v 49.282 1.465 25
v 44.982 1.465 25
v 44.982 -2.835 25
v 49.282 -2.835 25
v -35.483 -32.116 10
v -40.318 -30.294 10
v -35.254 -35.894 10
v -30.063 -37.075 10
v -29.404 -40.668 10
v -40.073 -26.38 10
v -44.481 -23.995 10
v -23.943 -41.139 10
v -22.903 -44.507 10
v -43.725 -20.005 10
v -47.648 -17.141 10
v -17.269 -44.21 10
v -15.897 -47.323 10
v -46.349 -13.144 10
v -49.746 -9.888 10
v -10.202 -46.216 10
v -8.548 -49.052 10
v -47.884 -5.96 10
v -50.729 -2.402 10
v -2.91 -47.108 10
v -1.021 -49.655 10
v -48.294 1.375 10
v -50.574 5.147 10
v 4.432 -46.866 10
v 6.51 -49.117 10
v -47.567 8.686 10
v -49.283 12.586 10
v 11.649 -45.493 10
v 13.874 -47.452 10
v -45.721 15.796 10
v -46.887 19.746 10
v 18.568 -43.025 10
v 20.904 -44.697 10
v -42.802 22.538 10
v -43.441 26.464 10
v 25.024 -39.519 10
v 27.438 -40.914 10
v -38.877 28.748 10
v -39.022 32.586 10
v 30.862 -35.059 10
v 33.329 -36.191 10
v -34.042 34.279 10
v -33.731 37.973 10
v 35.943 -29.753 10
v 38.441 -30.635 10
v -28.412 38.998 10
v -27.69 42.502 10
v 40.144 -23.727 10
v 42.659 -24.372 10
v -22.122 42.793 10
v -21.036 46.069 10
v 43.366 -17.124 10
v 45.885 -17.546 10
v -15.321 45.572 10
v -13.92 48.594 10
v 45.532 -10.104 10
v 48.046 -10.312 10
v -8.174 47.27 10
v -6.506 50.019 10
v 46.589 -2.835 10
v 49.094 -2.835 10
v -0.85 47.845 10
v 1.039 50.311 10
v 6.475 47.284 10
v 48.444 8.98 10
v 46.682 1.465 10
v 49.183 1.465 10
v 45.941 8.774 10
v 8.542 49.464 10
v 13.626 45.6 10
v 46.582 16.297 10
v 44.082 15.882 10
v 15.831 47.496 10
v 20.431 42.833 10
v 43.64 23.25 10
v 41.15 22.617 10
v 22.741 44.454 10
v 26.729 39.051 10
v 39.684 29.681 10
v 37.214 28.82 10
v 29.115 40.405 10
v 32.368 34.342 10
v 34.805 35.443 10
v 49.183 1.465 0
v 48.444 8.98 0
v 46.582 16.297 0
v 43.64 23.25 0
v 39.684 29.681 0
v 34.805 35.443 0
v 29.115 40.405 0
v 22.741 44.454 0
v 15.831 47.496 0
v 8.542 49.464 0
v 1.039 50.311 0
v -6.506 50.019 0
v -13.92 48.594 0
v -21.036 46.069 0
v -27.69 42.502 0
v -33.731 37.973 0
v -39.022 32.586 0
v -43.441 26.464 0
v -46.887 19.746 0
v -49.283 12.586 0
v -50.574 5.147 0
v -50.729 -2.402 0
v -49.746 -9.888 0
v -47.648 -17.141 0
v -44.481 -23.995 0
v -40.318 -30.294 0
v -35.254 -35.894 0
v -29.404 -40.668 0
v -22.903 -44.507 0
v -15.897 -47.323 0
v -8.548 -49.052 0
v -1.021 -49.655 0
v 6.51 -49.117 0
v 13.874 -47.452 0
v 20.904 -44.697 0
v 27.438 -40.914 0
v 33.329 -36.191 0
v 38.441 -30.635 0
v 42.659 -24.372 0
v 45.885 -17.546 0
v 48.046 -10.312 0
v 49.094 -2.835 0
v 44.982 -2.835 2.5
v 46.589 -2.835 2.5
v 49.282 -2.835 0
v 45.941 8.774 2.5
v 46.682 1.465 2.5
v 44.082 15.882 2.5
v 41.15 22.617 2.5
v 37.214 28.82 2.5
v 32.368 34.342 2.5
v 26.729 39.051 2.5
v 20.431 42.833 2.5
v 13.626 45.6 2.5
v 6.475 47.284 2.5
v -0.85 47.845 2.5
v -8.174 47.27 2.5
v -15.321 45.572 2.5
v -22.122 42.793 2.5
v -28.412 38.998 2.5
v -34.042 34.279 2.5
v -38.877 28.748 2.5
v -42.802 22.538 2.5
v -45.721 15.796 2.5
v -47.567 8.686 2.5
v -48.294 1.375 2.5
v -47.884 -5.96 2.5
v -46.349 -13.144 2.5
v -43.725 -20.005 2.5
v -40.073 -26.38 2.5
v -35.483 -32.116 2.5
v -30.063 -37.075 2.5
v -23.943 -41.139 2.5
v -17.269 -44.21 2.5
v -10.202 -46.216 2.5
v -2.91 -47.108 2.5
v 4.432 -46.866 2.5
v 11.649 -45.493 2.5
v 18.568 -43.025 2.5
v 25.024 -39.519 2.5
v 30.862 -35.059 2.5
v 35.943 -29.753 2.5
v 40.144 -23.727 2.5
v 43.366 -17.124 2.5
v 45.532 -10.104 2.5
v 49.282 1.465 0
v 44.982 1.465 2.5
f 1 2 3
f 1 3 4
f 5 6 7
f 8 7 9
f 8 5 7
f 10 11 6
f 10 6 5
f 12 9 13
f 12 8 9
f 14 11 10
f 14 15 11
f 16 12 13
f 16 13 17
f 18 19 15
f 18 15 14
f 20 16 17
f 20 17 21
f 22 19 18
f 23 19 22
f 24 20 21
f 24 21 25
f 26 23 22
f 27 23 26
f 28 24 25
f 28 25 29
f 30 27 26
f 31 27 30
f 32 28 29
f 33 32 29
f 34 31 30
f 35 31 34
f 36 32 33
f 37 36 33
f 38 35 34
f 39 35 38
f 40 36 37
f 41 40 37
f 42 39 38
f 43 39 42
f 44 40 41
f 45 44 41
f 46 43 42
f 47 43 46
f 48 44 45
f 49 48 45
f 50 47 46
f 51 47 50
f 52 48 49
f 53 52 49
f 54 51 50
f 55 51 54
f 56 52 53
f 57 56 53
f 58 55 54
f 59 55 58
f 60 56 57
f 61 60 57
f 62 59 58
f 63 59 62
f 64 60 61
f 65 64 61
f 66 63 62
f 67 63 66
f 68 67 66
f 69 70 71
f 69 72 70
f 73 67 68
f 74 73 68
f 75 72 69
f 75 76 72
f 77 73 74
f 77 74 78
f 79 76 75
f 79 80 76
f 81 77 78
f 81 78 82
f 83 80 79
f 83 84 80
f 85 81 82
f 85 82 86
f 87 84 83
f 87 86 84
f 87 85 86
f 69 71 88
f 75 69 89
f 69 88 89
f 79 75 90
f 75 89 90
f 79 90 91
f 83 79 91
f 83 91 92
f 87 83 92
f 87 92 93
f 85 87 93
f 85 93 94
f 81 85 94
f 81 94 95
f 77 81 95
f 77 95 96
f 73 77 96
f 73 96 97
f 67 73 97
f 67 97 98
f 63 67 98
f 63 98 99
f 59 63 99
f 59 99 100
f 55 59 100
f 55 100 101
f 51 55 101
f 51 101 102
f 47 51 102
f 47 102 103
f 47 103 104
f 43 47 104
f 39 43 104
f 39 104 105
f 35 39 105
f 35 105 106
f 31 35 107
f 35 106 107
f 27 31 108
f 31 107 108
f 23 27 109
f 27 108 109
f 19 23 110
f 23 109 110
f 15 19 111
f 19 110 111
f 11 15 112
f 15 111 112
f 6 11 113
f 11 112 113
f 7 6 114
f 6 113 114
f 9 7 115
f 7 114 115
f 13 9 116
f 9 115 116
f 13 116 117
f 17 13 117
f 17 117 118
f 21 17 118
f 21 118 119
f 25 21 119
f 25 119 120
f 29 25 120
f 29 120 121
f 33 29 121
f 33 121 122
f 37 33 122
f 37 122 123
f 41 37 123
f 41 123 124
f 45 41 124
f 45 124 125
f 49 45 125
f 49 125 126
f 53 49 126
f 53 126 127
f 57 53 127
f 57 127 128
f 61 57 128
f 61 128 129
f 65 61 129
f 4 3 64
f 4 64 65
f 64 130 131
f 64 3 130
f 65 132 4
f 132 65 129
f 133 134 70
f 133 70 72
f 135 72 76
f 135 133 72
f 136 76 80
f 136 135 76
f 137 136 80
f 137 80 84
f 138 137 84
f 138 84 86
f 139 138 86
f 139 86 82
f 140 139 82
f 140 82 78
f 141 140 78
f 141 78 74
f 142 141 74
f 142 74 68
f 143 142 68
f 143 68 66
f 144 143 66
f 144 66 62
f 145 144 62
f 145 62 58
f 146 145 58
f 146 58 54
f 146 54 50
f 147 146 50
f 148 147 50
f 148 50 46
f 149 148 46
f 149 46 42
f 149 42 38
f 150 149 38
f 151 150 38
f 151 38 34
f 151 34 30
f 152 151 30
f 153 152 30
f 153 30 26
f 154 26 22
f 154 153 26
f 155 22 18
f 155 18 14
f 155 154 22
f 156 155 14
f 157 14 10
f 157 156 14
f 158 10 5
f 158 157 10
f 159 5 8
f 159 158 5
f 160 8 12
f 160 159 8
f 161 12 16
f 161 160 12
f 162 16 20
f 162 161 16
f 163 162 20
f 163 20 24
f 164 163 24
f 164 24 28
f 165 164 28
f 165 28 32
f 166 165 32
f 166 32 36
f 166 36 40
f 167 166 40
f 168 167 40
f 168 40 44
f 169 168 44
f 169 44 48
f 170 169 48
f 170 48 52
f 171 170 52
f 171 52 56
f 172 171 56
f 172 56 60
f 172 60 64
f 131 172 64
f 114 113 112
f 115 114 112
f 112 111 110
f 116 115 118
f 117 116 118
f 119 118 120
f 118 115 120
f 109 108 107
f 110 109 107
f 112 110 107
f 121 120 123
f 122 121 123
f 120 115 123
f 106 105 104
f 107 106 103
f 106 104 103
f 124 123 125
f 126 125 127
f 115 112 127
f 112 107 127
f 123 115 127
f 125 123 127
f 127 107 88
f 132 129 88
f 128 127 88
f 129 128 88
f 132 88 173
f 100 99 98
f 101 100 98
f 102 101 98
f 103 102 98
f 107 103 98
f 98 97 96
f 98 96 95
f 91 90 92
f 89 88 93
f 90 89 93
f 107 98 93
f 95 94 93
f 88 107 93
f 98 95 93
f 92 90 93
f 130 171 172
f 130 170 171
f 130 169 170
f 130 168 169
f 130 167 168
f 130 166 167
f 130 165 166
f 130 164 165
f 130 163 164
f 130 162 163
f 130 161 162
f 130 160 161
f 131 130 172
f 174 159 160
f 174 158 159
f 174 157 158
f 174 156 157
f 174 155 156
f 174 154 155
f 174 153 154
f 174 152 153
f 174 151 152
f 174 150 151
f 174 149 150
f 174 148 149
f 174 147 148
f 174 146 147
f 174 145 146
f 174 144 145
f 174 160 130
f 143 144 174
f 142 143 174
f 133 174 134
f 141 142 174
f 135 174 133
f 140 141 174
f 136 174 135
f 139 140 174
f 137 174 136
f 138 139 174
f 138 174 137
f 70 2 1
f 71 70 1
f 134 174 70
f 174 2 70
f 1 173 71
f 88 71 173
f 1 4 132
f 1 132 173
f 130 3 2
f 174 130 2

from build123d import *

# Parameters (mm, degrees)
F0_R     = 50
F1_DEPTH = 10
F2_T     = -2.5
F3_W     = 4.3
F3_H     = 4.3
F4_DEPTH = 25


with BuildPart() as f1:
    # F0 (on Top) → F1 (new body)
    with BuildSketch(Plane.XY):
        with Locations((-0.804745, 0.344891)):
            Circle(F0_R)
    extrude(amount=F1_DEPTH)

    # F2
    f2_openings = [f1.faces().sort_by_distance(p)[0] for p in [
        (-0.804745, 0.344891, 10),
    ]]
    offset(amount=F2_T, openings=f2_openings)

    # F3 (on Top) → F4 (join)
    with BuildSketch(Plane.XY):
        with Locations((47.132396, -0.684507)):
            Rectangle(F3_W, F3_H)
    extrude(amount=F4_DEPTH)


solid = f1.part
